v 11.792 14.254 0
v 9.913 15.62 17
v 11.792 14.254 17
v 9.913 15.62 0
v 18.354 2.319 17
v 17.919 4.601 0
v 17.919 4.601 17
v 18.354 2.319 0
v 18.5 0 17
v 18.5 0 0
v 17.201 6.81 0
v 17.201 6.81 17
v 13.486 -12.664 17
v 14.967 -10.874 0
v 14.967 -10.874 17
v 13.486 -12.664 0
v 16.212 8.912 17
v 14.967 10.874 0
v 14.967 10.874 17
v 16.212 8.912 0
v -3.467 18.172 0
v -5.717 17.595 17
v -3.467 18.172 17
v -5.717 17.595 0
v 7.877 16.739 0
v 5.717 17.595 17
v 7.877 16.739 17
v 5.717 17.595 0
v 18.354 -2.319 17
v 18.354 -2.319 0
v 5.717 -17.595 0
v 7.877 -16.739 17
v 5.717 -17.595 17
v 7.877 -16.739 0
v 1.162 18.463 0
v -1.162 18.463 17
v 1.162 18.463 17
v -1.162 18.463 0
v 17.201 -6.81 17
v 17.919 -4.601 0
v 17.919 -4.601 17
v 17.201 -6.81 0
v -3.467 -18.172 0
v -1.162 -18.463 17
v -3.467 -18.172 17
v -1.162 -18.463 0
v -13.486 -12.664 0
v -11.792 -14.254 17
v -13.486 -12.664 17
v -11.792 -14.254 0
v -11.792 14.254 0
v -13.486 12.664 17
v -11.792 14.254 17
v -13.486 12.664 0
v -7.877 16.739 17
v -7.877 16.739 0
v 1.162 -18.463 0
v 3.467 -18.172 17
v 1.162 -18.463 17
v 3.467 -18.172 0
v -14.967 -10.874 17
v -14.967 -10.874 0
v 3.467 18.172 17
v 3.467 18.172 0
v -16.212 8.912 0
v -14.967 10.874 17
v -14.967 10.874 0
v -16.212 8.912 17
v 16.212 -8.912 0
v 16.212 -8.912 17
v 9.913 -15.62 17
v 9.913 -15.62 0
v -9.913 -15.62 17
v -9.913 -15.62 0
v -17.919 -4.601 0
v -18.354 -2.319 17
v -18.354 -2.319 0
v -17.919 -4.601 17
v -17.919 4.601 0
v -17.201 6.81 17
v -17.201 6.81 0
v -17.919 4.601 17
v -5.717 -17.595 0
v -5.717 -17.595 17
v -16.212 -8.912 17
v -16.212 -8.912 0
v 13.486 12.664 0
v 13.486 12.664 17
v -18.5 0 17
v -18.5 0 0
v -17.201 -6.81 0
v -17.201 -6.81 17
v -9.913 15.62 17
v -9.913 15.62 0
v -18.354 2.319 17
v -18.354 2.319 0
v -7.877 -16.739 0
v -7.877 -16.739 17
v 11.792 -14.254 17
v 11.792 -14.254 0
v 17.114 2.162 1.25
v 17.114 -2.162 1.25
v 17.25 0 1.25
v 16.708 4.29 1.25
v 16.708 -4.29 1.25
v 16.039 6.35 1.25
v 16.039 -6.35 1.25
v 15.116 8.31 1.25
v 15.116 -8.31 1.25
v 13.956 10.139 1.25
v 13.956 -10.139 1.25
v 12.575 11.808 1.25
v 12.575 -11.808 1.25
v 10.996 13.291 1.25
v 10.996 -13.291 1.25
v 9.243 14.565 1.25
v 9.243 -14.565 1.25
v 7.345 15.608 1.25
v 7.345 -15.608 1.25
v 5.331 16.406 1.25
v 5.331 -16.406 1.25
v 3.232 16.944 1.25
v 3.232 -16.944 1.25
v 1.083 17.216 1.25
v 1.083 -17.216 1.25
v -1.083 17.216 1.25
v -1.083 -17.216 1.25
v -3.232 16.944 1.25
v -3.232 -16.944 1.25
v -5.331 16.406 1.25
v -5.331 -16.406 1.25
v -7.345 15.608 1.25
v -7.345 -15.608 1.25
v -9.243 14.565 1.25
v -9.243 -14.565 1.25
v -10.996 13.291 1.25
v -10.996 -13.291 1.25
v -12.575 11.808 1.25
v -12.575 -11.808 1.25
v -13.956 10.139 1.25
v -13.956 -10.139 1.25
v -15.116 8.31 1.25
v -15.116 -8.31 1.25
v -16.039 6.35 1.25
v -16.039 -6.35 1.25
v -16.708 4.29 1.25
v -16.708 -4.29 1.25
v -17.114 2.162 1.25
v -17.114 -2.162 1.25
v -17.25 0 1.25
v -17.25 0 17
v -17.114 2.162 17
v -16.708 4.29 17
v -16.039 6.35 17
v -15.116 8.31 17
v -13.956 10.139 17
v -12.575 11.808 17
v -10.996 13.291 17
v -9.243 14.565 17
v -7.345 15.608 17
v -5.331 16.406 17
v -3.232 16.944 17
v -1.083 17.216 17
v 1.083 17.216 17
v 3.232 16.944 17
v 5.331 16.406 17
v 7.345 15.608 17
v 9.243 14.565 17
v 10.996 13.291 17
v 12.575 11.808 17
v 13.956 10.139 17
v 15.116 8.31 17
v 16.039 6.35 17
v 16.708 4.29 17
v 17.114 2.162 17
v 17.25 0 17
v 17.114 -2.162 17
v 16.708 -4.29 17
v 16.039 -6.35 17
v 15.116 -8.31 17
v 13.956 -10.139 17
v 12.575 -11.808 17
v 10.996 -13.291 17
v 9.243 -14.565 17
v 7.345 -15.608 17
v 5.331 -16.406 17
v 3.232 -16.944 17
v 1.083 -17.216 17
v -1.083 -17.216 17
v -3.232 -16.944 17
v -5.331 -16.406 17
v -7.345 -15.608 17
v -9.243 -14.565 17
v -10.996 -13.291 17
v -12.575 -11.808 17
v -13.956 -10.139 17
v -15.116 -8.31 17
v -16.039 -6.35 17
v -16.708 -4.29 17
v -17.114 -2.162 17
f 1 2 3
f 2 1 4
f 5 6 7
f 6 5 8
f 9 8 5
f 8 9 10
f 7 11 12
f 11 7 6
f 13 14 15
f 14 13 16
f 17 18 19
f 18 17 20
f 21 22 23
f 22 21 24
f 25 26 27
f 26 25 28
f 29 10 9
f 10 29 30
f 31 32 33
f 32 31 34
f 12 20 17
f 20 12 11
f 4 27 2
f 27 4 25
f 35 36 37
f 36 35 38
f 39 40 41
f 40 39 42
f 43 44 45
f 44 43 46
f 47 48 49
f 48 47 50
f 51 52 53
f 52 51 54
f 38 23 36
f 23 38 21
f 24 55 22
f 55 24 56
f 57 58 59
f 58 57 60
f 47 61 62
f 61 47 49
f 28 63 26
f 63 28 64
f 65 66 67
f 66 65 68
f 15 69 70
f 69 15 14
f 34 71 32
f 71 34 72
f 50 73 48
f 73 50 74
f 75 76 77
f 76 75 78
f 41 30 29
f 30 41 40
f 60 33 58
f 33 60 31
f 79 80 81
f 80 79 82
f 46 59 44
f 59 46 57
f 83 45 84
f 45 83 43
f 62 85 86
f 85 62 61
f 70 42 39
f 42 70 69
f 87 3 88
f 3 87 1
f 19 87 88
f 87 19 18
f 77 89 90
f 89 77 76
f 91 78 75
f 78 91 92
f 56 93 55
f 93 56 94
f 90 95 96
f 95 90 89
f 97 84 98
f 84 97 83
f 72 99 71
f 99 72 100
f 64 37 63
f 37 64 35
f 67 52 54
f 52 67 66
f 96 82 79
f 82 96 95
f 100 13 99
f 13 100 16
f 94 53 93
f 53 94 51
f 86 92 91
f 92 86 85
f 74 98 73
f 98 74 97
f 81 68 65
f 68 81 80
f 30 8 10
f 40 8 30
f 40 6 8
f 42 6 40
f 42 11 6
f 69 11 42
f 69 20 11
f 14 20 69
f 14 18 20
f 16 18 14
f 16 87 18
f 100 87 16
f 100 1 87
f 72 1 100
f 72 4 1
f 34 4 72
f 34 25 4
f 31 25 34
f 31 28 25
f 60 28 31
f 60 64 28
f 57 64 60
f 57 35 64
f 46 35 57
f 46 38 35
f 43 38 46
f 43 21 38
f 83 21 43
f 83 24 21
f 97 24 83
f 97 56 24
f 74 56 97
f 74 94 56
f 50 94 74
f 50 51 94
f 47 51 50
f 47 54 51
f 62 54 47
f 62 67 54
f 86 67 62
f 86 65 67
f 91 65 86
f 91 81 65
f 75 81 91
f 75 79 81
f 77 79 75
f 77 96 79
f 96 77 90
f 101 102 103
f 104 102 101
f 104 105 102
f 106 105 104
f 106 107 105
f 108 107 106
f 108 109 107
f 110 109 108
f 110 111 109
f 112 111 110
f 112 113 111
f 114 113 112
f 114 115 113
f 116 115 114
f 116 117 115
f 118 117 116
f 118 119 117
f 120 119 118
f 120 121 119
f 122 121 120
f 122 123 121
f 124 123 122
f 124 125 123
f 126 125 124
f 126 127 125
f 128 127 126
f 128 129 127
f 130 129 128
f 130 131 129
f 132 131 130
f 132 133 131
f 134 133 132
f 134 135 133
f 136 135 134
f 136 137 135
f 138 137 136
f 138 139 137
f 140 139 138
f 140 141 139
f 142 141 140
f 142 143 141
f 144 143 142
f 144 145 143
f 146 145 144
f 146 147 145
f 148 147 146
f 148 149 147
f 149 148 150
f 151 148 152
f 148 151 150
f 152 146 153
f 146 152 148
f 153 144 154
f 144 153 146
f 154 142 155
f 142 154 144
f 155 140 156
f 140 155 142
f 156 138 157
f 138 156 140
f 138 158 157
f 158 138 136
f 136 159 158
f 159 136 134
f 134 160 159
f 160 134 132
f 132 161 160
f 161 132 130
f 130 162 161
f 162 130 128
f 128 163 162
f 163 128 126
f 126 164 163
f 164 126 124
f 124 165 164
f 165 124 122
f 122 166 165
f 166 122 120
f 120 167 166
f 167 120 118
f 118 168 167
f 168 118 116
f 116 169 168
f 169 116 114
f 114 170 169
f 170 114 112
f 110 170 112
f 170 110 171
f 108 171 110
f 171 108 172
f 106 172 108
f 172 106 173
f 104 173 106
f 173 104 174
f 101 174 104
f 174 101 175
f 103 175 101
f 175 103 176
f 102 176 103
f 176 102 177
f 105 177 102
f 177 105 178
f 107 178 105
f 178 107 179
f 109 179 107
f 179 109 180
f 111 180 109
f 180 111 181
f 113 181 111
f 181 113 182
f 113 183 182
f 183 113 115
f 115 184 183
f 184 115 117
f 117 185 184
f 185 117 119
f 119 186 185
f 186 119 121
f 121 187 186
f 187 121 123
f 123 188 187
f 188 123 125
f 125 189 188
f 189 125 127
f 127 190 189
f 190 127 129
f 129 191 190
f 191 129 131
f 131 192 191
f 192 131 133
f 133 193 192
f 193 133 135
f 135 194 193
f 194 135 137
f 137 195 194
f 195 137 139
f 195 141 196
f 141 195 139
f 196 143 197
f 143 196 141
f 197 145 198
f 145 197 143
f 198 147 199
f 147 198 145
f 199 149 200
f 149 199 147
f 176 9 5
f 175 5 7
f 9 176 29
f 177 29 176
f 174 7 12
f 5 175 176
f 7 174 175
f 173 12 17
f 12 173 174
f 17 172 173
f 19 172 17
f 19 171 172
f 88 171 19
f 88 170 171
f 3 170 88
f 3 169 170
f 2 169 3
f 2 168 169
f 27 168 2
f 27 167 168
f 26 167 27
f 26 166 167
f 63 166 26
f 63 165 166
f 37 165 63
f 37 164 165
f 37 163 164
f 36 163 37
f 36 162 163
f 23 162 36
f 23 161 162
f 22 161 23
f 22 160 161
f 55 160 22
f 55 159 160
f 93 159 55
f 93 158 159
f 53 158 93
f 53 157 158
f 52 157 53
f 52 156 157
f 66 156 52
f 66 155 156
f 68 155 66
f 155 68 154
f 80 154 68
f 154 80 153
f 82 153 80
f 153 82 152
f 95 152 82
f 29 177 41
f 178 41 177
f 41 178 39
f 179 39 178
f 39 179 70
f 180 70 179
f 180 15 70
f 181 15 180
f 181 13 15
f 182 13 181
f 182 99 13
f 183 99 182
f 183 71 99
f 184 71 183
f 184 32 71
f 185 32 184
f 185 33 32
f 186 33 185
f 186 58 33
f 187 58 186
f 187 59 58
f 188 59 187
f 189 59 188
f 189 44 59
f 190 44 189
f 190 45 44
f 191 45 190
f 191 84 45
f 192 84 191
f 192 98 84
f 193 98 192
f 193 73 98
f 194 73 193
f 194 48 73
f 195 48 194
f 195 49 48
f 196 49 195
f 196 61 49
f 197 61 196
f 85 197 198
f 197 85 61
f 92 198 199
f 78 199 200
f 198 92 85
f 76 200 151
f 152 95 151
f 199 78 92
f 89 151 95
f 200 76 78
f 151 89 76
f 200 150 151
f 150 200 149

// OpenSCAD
// file: funciones.scad
   
module translate_giro(d, angulo) {
    translate([-d * cos(180-angulo), d * sin(180-angulo), 0])
        rotate(angulo)
            children();
}

module raise(z) {
    translate([0, 0, z]) children();
}

module semiesfera(di) {
    intersection() {
        sphere(d=di);
        translate([di/4, 0]) cube([di/2, di, di], true);
    }
}


module semiesfera_redondeada(diametro, diametro_redondeo = 0) {
    diametro_redondeo = diametro_redondeo == 0 ? diametro / 4 : diametro_redondeo;
    
    diametro2 = diametro / 2;
    diametro_redondeo2 = diametro_redondeo / 2;
    ddr2 = diametro2 - diametro_redondeo2;
    
    union () {
        translate([diametro_redondeo2, 0, 0]) resize([ddr2, diametro, diametro]) semiesfera(diametro);
        
        intersection() {
            translate([diametro_redondeo2, 0, 0]) rotate([0, 90]) toro(diametro, diametro_redondeo);
            translate([diametro_redondeo2 /2, 0, 0]) cube([diametro_redondeo2, diametro, diametro], true);
        }
        
        rotate([0, 90]) cylinder(diametro_redondeo2, d=diametro - diametro_redondeo);
    }
}

module cuartoesfera(di) {
    intersection() {
        sphere(d=di);
        translate([di/4, di/4]) cube([di/2, di/2, di], true);
    }
}

module cuartoesfera_aplastada(di, ancho, x = true) {
    if (x)
        resize([ancho/2, di/2, di]) cuartoesfera(di);
    else
        rotate(90) resize([di/2, ancho/2, di]) cuartoesfera(di);
}

module semicircle(diametro) {
    intersection() {
        circle(d=diametro);
        translate([diametro/4, 0]) square([diametro/2, diametro], true);
    }
}

module semicircle_redondeado(diametro, diametro_redondeo = 0) {
    diametro_redondeo = diametro_redondeo == 0 ? diametro / 4 : diametro_redondeo;
    
    translate([diametro_redondeo/2, 0]) resize([diametro/2 - diametro_redondeo/2, diametro]) semicircle(diametro);
    translate([diametro_redondeo/2, diametro/2 - diametro_redondeo/2]) rotate(90) cuartocircle(diametro_redondeo);
    translate([diametro_redondeo/2, -(diametro/2 - diametro_redondeo/2)]) rotate(180) cuartocircle(diametro_redondeo);
    translate([diametro_redondeo/4, 0]) square([diametro_redondeo/2, diametro - diametro_redondeo], true);
}

module cuartocircle(diametro) {
    intersection() {
        circle(d=diametro);
        translate([diametro/4, diametro/4]) square([diametro/2, diametro/2], true);
    }
}

module talla_cuartocircle(radio) {
    difference() {
        square(radio);
        circle(radio);
    }
}

module semicylinder(altura, diametro) {
    intersection() {
        cylinder(altura, d=diametro);
        translate([0, -diametro/2, 0]) cube([diametro/2, diametro, altura]);
    }
}

module semicylinder_hueco(altura, diametro, grosor) {
    // Queda feo en la previsualizacion
    //
    // difference() {
    //     semicylinder(altura, diametro);
    //     semicylinder(altura, diametro-grosor);
    // }
    
    rotate(-90) rotate_extrude(angle=180) translate([diametro/2 - grosor, 0]) square([grosor, altura]);
}

module cuartocylinder_hueco(altura, diametro, grosor) {
    rotate(0) rotate_extrude(angle=90) translate([diametro/2 - grosor, 0]) square([grosor, altura]);
}

module cylinder_hueco(altura, diametro, grosor) {
    rotate_extrude(angle=360) translate([diametro/2 - grosor, 0]) square([grosor, altura]);
}

module toro_parcial(diametro_grande, diametro_pequeno, angulo) {
    rotate_extrude(angle=angulo)
        translate([diametro_grande/2 - diametro_pequeno / 2, 0])
            circle(d=diametro_pequeno);
}

function radio_horizontal(radio, altura_desde_arriba) = radio*sin(acos((radio-altura_desde_arriba)/radio));

module toro(diametro_grande, diametro_pequeno) {
    rotate_extrude()
        translate([diametro_grande/2 - diametro_pequeno / 2, 0])
            circle(d=diametro_pequeno);
}

module talla_semicilindro(ancho, largo) {
    difference() {
        cube([ancho/2, largo, ancho], true);
        translate([-ancho/4, largo/2, 0]) rotate([90, 0]) cylinder(largo, d=ancho);
    }
}

module talla_cuartocirculo(ancho, largo) {
    difference() {
        cube([ancho, largo, ancho], true);
        translate([-ancho/2, largo/2, -ancho/2]) rotate([90, 0]) cylinder(largo, d=ancho*2);
    }
}

module sector_circular(diametro, angulo) {
    angulo2 = angulo / 2;
    
    if (0 == angulo) {
        // Nothing
    } else if (360 <= angulo) {
        circle(d = diametro);
    } else if (180 <= angulo) {
        union () {
            difference() {
                circle(d = diametro);
                color("red") rotate(angulo2) translate([0, diametro/4]) square([diametro, diametro/2], true);
            }
            
            difference() {
                circle(d = diametro);
                color("purple") rotate(360-angulo2) translate([0, -diametro/4]) square([diametro, diametro/2], true);
            }
        }
    } else {
        difference() {
            circle(d = diametro);
            color("red") rotate(angulo2) translate([0, diametro/4]) square([diametro, diametro/2], true);
            color("purple") rotate(360-angulo2) translate([0, -diametro/4]) square([diametro, diametro/2], true);
        }
    }
}

module talla_semicirculo(diametro, rotacion = 0, sobresaliente = 0) {
    rotate(rotacion) 
        difference() {
            square([diametro / 2 + sobresaliente * 2, diametro + sobresaliente], true);
            translate([-diametro / 4, 0]) circle(d = diametro);
            translate([-sobresaliente/2 -diametro/4 - 0.5, 0]) square([sobresaliente + 1, diametro], true);
        }
}

module arco_redondeado(diametro, grosor, angulo, bolas_en_exterior = true) {
    $fn = 100;

    diametro2         = diametro / 2;
    grosor2           = grosor / 2;
    diametro_medio    = diametro2 - grosor2;
    diametro_interior = diametro - 2 * grosor;
    alpha             = asin(grosor2 / diametro_medio);
    angulo            = bolas_en_exterior ? angulo : angulo - 2 * alpha;
    angulo2           = angulo / 2;
    
    union() {
        difference() {
            sector_circular(diametro, angulo);
            sector_circular(diametro_interior, angulo + 10);
        }
        
        color("red") translate_giro(diametro_medio, angulo2)  circle(d=grosor);
        color("red") translate_giro(diametro_medio, -angulo2) circle(d=grosor);
    }
}
// main file
use <funciones.scad>

$fn = 50;
diametro_corona = 6;
separacion_coronas = 10;
ancho = 29;
grosor = 2.5;
angulo = 305;
bottom_trim = 0.25;
angulo_hueco = 12;
diametro_hueco = 4.7;

ancho_cubo = 8;
alto_cubo = diametro_corona - 0.5;
ancho_inner_cubo = 4;
alto_inner_cubo = 4;
diferencia_inner_cubo = 3;

/////

ancho_tapa = ancho + diametro_corona/2 + 5;
ancho_cuadrado = diametro_corona/4;
redondeo = 1;
angulo_apertura = (360-angulo)/2;

//anillo();
//translate([-25, 0]) travesanio(0.2, 0);
tapa();

module tapa() {
    cylinder(grosor/2, d=ancho_tapa);
    cylinder_hueco(separacion_coronas - bottom_trim + diametro_corona + grosor/2, ancho_tapa, grosor/2);
}

module anillo() {
    difference() {
        rotate(angulo_apertura)
            rotate_extrude(angle=angulo) {
                translate([ancho/2 - ancho_cuadrado, separacion_coronas+diametro_corona/2 - bottom_trim]) semicircle_redondeado(diametro_corona);
                
                color("red") translate([ancho/2 - ancho_cuadrado, diametro_corona/2 - bottom_trim]) square([ancho_cuadrado, separacion_coronas]);
                difference() {
                    translate([ancho/2 - ancho_cuadrado, diametro_corona/2 - bottom_trim]) semicircle_redondeado(diametro_corona);
                    translate([ancho/2 - ancho_cuadrado, - bottom_trim]) square([diametro_corona/2, bottom_trim]);
                }
                
            }
        raise(-alto_cubo / 2 + separacion_coronas - bottom_trim + diametro_corona) cube([ancho_cubo, 1 + ancho - 2 * ancho_cuadrado, alto_cubo], true);
        raise(-alto_inner_cubo / 2 + separacion_coronas - bottom_trim + diametro_corona) cube([ancho_inner_cubo, diferencia_inner_cubo + ancho - 2 * ancho_cuadrado, alto_inner_cubo], true);
    }

    translate_giro(ancho/2 - ancho_cuadrado, angulo_apertura) raise(separacion_coronas+diametro_corona/2 - bottom_trim) semiesfera_redondeada(diametro_corona);
    translate_giro(ancho/2 - ancho_cuadrado + ancho_cuadrado/2, angulo_apertura) raise(diametro_corona/2 - bottom_trim)  cylinder(separacion_coronas, d=ancho_cuadrado);
    translate_giro(ancho/2 - ancho_cuadrado, angulo_apertura) difference () {
        raise(diametro_corona/2 - bottom_trim) semiesfera_redondeada(diametro_corona); 
        translate([diametro_corona/4, 0, -bottom_trim/2]) cube([diametro_corona / 2, diametro_corona, bottom_trim], true);
    }

    translate_giro(ancho/2 - ancho_cuadrado, -angulo_apertura) raise(separacion_coronas+diametro_corona/2 - bottom_trim) semiesfera_redondeada(diametro_corona);
    translate_giro(ancho/2 - ancho_cuadrado + ancho_cuadrado/2, -angulo_apertura) raise(diametro_corona/2 - bottom_trim)  cylinder(separacion_coronas, d=ancho_cuadrado);
    translate_giro(ancho/2 - ancho_cuadrado, -angulo_apertura) difference () {
        raise(diametro_corona/2 - bottom_trim) semiesfera_redondeada(diametro_corona); 
        translate([diametro_corona/4, 0, -bottom_trim/2]) cube([diametro_corona / 2, diametro_corona, bottom_trim], true);
    }
}

module travesanio(holgura, diferencia_expansora) {
    ajuste = holgura + diferencia_expansora;
    ancho_travesanio = ancho - 2 * ancho_cuadrado - ajuste + 1;

    difference() {
        union () {
            raise(alto_cubo / 2)       cube([ancho_cubo, ancho_travesanio, alto_cubo - holgura], true);
            raise(alto_inner_cubo / 2) cube([ancho_inner_cubo, diferencia_inner_cubo + ancho - 2 * ancho_cuadrado - ajuste, alto_inner_cubo - holgura], true);
        }
        resize([0, 0, 10]) translate([- ancho_cubo/2 - 0.5, 0, (ancho_travesanio - 2 * grosor)/2 + 2 * grosor]) rotate([0, 90]) cylinder(ancho_cubo + 1, d = ancho_travesanio -  grosor);
    }
}
